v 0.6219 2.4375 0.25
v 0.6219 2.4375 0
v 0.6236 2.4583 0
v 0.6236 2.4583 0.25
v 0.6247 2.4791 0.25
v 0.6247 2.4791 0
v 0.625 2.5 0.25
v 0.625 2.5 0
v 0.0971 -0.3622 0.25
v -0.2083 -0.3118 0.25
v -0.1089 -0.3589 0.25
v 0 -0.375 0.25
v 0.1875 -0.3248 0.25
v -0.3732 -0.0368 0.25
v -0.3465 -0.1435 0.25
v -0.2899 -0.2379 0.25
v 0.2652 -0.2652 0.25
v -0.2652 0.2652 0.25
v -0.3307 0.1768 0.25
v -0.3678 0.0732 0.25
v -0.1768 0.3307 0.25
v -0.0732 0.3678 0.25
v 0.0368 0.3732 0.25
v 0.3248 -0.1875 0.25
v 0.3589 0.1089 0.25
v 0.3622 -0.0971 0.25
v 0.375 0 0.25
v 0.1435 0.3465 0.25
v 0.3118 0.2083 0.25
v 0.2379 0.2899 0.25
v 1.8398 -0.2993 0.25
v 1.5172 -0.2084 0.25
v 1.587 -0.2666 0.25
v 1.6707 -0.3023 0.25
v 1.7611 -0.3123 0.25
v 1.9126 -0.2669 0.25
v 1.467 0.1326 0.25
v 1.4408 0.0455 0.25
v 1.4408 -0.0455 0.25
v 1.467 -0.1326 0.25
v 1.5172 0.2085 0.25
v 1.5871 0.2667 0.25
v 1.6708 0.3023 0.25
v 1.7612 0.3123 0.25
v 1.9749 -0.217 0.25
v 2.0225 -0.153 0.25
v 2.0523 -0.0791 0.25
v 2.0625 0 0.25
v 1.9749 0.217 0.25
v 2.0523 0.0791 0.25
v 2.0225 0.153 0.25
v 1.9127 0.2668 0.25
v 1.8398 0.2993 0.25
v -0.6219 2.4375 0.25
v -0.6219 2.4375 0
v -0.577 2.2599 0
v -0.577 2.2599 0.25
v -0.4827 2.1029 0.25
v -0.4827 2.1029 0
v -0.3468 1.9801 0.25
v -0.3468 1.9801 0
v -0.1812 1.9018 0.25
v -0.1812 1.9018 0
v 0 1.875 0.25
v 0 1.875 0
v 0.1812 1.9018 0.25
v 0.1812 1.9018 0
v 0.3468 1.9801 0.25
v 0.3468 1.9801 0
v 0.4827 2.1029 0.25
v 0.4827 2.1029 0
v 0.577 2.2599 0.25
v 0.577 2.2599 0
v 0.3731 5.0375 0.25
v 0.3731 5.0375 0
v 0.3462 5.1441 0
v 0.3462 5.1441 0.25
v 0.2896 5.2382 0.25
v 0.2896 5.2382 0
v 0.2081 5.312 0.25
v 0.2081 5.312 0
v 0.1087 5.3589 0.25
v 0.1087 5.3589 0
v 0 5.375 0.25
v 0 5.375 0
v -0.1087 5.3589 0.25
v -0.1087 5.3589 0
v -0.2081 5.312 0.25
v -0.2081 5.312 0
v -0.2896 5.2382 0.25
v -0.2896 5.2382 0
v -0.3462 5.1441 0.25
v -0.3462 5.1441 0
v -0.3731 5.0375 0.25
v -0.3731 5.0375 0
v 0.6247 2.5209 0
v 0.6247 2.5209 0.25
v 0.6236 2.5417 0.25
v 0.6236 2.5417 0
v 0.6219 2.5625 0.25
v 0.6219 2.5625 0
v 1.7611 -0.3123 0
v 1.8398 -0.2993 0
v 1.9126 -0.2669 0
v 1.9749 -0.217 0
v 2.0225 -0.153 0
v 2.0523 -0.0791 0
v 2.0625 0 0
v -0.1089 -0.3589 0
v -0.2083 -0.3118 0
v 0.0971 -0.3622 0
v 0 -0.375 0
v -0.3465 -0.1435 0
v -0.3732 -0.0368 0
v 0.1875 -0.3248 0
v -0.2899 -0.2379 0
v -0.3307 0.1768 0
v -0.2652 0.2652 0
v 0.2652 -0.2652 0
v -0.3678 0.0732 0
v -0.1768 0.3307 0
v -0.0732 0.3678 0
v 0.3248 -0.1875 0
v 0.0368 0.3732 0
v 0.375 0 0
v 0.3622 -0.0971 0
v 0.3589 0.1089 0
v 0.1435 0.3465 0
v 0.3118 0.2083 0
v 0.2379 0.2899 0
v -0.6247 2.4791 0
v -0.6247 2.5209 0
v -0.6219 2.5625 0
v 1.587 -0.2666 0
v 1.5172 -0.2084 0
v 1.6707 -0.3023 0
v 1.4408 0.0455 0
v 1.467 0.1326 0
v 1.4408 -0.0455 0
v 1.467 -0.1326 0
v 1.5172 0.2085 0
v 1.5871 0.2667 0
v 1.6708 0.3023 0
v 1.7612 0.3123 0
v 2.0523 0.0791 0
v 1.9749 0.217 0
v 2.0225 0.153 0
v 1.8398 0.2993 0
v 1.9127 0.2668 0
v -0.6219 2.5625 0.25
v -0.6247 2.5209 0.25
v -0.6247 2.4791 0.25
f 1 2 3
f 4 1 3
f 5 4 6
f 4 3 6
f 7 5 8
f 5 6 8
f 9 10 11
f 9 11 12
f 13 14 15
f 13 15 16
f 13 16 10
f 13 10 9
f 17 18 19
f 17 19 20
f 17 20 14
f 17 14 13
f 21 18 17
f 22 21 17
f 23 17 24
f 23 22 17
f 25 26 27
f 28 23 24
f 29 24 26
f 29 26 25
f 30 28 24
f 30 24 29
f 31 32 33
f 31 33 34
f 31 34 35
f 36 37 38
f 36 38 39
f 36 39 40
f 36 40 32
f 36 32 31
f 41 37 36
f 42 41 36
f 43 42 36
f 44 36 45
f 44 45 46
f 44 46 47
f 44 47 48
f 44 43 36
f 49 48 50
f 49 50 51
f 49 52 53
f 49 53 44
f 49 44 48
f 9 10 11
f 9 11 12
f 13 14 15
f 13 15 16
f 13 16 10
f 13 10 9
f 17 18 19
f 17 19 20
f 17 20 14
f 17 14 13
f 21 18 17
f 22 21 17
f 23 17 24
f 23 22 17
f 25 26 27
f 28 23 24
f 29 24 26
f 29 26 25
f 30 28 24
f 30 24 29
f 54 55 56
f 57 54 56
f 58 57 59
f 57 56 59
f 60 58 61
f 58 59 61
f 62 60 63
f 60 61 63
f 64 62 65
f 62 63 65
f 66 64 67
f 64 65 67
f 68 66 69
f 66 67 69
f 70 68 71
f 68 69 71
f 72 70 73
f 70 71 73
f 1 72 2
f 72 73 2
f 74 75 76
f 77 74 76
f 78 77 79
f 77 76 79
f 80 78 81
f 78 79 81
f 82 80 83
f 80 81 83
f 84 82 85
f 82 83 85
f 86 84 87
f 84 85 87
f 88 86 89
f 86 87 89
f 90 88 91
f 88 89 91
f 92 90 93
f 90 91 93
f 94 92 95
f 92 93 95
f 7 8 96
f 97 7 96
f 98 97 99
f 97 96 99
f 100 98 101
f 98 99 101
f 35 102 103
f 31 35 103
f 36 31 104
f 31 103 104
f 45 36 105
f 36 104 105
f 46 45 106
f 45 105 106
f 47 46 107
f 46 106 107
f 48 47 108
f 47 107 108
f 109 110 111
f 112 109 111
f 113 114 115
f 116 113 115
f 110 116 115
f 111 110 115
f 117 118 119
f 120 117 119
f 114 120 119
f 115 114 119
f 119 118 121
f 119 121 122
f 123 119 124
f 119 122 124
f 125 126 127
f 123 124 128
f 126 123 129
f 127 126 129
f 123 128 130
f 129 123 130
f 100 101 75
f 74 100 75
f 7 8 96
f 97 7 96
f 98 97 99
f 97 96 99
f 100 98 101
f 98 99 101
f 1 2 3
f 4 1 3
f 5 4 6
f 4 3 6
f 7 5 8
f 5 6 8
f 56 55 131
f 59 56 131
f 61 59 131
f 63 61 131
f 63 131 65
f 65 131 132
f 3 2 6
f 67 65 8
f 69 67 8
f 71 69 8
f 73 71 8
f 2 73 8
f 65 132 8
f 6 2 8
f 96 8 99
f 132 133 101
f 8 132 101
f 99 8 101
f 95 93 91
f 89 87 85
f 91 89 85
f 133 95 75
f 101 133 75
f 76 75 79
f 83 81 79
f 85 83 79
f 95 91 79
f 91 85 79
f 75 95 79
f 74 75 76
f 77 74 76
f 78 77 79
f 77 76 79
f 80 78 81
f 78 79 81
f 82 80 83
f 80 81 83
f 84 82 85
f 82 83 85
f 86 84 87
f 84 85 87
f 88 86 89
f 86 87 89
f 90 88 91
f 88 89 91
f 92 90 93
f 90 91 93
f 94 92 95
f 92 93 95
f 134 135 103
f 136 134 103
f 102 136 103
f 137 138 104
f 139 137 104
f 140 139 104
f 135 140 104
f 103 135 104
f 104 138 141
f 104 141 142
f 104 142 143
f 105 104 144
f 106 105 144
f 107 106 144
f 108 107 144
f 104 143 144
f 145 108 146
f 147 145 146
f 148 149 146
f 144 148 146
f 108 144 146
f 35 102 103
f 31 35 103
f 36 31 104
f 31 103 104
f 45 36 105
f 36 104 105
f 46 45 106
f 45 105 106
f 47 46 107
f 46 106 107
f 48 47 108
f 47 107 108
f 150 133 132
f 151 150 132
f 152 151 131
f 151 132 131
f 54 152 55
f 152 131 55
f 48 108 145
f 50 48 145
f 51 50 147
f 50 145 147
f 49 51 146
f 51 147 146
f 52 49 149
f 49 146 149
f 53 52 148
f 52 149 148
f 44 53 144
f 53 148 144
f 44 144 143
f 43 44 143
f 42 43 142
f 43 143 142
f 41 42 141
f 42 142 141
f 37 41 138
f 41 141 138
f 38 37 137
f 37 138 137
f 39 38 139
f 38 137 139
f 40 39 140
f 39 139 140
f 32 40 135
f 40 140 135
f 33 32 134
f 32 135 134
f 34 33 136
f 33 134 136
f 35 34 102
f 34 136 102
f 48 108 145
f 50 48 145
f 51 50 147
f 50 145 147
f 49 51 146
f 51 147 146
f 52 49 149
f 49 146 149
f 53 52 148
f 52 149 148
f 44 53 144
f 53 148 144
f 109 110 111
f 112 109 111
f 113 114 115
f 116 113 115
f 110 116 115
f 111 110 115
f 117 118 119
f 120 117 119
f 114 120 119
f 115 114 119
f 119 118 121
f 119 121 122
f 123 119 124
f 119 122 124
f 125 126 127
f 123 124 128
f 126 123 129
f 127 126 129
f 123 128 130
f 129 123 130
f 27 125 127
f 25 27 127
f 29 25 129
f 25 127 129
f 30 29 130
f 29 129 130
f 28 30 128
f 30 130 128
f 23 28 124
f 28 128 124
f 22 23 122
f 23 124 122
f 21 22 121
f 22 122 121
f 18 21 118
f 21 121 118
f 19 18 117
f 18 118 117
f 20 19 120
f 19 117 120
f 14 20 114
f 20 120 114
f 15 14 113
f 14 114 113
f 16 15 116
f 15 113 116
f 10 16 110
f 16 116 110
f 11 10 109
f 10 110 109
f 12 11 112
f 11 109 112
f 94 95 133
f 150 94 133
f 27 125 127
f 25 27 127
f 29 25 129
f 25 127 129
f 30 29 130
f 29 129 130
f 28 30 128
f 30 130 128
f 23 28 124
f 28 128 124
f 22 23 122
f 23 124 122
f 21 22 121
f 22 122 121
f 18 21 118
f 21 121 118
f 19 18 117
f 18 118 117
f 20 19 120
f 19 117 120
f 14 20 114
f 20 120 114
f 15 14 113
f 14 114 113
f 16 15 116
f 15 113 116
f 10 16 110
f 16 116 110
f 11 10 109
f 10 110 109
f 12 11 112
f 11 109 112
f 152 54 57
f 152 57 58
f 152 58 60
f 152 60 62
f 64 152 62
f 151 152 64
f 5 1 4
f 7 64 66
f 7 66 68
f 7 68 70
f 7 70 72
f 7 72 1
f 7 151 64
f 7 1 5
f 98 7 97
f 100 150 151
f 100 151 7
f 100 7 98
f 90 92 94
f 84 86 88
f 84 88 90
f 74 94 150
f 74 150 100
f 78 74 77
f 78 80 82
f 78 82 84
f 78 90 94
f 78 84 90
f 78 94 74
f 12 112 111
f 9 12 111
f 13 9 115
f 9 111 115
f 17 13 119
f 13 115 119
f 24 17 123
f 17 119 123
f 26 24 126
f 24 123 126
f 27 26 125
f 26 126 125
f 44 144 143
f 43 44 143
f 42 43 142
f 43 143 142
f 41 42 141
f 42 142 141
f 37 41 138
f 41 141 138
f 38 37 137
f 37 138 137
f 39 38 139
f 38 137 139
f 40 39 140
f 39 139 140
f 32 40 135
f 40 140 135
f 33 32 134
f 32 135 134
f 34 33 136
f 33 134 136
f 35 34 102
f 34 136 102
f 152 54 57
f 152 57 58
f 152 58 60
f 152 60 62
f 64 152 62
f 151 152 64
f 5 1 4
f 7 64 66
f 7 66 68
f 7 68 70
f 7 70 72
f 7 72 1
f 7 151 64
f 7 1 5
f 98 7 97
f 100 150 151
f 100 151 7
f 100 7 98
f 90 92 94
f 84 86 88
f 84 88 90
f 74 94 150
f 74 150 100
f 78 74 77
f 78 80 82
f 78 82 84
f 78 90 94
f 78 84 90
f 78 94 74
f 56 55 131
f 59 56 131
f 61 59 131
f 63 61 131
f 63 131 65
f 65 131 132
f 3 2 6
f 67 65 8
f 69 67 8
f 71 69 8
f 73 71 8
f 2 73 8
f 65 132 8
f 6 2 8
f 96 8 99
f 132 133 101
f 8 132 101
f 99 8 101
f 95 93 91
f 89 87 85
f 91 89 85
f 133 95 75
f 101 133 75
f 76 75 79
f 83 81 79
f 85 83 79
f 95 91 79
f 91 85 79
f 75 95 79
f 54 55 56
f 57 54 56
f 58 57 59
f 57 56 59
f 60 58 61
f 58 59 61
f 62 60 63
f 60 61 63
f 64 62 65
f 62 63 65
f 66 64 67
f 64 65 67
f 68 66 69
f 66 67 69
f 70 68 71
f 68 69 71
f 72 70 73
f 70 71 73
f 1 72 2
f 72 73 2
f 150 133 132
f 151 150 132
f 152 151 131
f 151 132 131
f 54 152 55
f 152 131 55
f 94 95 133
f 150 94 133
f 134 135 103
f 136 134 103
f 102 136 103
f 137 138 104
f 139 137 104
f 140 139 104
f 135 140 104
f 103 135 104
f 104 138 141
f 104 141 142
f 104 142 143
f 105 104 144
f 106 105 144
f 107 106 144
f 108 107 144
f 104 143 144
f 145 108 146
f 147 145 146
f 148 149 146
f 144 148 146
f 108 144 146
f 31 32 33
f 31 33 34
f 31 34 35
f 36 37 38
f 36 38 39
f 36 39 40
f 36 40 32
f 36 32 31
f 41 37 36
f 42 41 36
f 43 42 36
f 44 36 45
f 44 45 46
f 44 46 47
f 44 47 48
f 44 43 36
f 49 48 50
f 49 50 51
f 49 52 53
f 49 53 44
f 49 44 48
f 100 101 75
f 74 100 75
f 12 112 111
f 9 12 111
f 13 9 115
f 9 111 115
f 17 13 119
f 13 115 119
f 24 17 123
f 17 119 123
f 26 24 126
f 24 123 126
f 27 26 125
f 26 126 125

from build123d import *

# Parameters (mm, degrees)
F1_DEPTH = 0.25
F2_DEPTH = 0.25


with BuildPart() as f1:
    # F0 (on Top) → F1 (new body)
    with BuildSketch(Plane.XY):
        with BuildLine():
            ThreePointArc((-0.6218671482, 2.4375), (0, 1.875), (0.6218671482, 2.4375))
            ThreePointArc((0.6218671482, 2.4375), (0.6242162957, 2.4687107656), (0.625, 2.5))
            ThreePointArc((0.625, 2.5), (0.6242162957, 2.5312892344), (0.6218671482, 2.5625))
            ThreePointArc((0.6218671482, 2.5625), (0, 3.125), (-0.6218671482, 2.5625))
            ThreePointArc((-0.6218671482, 2.5625), (-0.625, 2.5), (-0.6218671482, 2.4375))
        make_face()
        with BuildLine():
            Line((-0.3731202889, 5.0375), (-0.6218671482, 2.5625))
            ThreePointArc((-0.6218671482, 2.5625), (0, 3.125), (0.6218671482, 2.5625))
            Line((0.6218671482, 2.5625), (0.3731202889, 5.0375))
            ThreePointArc((0.3731202889, 5.0375), (0.3745297774, 5.0187735406), (0.375, 5))
            ThreePointArc((0.375, 5), (-0.0187735406, 4.6254702226), (-0.3731202889, 5.0375))
        make_face()
        with BuildLine():
            ThreePointArc((0.3731202889, 5.0375), (0, 5.375), (-0.3731202889, 5.0375))
            ThreePointArc((-0.3731202889, 5.0375), (-0.0187735406, 4.6254702226), (0.375, 5))
            ThreePointArc((0.375, 5), (0.3745297774, 5.0187735406), (0.3731202889, 5.0375))
        make_face()
    extrude(amount=F1_DEPTH)


with BuildPart() as f1b:
    # F0 (on Top) → F1, piece 2 (new body)
    with BuildSketch(Plane.XY):
        with BuildLine():
            ThreePointArc((1.7611607143, 0.3123006379), (1.4375000007, 2.12117e-05), (1.7611183179, -0.3123021502))
            ThreePointArc((1.7611183179, -0.3123021502), (1.9748674324, -0.2170043498), (2.0625, 0))
            ThreePointArc((2.0625, 0), (1.9748821616, 0.2169890859), (1.7611607143, 0.3123006379))
        make_face()
    extrude(amount=F1_DEPTH)


with BuildPart() as f1c:
    # F0 (on Top) → F1, piece 3 (new body)
    with BuildSketch(Plane.XY):
        with BuildLine():
            ThreePointArc((0, -0.375), (0.2651650429, -0.2651650429), (0.375, 0))
            ThreePointArc((0.375, 0), (-0.2651650429, 0.2651650429), (0, -0.375))
        make_face()
    extrude(amount=F1_DEPTH)


with BuildPart() as f2:
    # F0 (on Top) → F2 (new body)
    with BuildSketch(Plane.XY):
        with BuildLine():
            ThreePointArc((-0.6218671482, 2.4375), (0, 1.875), (0.6218671482, 2.4375))
            ThreePointArc((0.6218671482, 2.4375), (0.6242162957, 2.4687107656), (0.625, 2.5))
            ThreePointArc((0.625, 2.5), (0.6242162957, 2.5312892344), (0.6218671482, 2.5625))
            ThreePointArc((0.6218671482, 2.5625), (0, 3.125), (-0.6218671482, 2.5625))
            ThreePointArc((-0.6218671482, 2.5625), (-0.625, 2.5), (-0.6218671482, 2.4375))
        make_face()
        with BuildLine():
            Line((-0.3731202889, 5.0375), (-0.6218671482, 2.5625))
            ThreePointArc((-0.6218671482, 2.5625), (0, 3.125), (0.6218671482, 2.5625))
            Line((0.6218671482, 2.5625), (0.3731202889, 5.0375))
            ThreePointArc((0.3731202889, 5.0375), (0.3745297774, 5.0187735406), (0.375, 5))
            ThreePointArc((0.375, 5), (-0.0187735406, 4.6254702226), (-0.3731202889, 5.0375))
        make_face()
        with BuildLine():
            ThreePointArc((0.3731202889, 5.0375), (0, 5.375), (-0.3731202889, 5.0375))
            ThreePointArc((-0.3731202889, 5.0375), (-0.0187735406, 4.6254702226), (0.375, 5))
            ThreePointArc((0.375, 5), (0.3745297774, 5.0187735406), (0.3731202889, 5.0375))
        make_face()
    extrude(amount=F2_DEPTH)


with BuildPart() as f2b:
    # F0 (on Top) → F2, piece 2 (new body)
    with BuildSketch(Plane.XY):
        with BuildLine():
            ThreePointArc((1.7611607143, 0.3123006379), (1.4375000007, 2.12117e-05), (1.7611183179, -0.3123021502))
            ThreePointArc((1.7611183179, -0.3123021502), (1.9748674324, -0.2170043498), (2.0625, 0))
            ThreePointArc((2.0625, 0), (1.9748821616, 0.2169890859), (1.7611607143, 0.3123006379))
        make_face()
    extrude(amount=F2_DEPTH)


with BuildPart() as f2c:
    # F0 (on Top) → F2, piece 3 (new body)
    with BuildSketch(Plane.XY):
        with BuildLine():
            ThreePointArc((0, -0.375), (0.2651650429, -0.2651650429), (0.375, 0))
            ThreePointArc((0.375, 0), (-0.2651650429, 0.2651650429), (0, -0.375))
        make_face()
    extrude(amount=F2_DEPTH)


solid = Compound([f1.part, f1b.part, f1c.part, f2.part, f2b.part, f2c.part])
